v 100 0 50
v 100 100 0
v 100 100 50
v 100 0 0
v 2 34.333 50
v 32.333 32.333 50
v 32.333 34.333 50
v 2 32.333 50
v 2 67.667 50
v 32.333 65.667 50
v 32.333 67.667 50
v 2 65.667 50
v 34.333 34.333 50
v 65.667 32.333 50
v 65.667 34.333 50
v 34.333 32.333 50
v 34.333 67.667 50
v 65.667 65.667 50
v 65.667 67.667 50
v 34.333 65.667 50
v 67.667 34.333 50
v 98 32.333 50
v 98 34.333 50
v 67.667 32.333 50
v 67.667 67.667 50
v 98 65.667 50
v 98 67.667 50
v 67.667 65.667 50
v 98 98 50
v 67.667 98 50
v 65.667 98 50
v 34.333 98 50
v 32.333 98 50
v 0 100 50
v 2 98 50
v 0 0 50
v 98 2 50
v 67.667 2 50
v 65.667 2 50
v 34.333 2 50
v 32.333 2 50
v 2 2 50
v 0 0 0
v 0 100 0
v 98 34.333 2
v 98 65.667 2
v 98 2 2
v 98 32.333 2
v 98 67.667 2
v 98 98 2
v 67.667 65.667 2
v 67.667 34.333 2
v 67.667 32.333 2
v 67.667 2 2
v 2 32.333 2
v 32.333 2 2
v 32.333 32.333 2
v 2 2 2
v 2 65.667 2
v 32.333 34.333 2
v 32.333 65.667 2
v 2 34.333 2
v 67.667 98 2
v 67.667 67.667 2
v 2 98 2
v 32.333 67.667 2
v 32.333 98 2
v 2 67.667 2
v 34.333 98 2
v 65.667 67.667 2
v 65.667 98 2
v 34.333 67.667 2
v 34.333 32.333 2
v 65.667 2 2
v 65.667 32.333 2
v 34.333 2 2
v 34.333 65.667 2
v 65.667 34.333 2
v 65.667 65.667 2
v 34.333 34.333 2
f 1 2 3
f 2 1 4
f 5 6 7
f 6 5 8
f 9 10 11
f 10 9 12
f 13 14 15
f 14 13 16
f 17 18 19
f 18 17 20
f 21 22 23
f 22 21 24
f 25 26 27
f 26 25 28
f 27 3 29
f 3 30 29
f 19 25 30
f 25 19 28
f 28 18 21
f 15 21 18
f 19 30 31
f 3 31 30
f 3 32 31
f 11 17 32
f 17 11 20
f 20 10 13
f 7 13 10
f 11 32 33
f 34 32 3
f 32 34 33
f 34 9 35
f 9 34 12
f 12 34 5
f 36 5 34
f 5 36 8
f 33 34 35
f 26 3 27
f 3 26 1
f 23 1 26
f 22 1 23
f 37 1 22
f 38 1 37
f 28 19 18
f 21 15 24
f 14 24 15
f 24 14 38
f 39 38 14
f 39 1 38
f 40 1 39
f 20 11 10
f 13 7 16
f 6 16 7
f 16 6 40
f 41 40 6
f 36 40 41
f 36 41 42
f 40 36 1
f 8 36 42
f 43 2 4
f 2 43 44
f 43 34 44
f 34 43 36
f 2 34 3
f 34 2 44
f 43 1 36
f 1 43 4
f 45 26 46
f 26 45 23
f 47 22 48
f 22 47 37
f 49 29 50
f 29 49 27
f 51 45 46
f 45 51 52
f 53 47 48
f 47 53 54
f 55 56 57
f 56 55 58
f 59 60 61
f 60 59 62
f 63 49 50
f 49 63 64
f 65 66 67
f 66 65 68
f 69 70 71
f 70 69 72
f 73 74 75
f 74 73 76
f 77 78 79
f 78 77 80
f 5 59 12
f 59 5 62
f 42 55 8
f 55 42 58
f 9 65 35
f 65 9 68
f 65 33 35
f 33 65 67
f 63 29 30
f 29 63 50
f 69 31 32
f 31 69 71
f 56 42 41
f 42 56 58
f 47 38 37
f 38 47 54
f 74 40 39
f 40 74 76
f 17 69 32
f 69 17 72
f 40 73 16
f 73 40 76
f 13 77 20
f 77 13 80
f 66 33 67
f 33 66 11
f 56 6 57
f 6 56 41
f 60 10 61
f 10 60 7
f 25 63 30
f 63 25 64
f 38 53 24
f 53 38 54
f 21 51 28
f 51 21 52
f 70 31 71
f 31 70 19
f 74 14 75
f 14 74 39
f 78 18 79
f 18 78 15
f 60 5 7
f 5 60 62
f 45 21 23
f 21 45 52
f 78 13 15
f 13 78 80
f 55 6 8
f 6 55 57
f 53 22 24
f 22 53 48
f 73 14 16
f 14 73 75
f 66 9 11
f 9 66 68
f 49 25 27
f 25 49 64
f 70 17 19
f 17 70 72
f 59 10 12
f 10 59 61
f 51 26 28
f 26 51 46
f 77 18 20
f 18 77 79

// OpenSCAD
/* [Settings:] */

// Thickness of the walls in mm
wall_thickness = 2; // [1,2,3,4,5]

/* [Dimensions:] */

// Length of the compartment in mm
length = 100;

// Width of the compartment in mm
width = 100;

// Height of the compartment in mm
height = 50;

/* [Compartments:] */

// Vertical dividers (columns)
columns = 2; // [0:10]

// Horizontal dividers (rows)
rows = 2; // [0:10]

module compartment()
{
	// Create the outer shell of the box
	difference()
	{
		// Outer box
		cube([ length, width, height ]);

		// Create the inner void
		translate([ wall_thickness, wall_thickness, wall_thickness ])

		// Subtract inner box
		cube([ length - 2 * wall_thickness, width - 2 * wall_thickness, height - wall_thickness ]);
	}

	// Add column dividers if columns > 0
	if (columns > 0)
	{
		for (i = [1:columns])
		{
			translate([ (length / (columns + 1)) * i - (wall_thickness / 2), wall_thickness, wall_thickness ])
			cube([ wall_thickness, width - 2 * wall_thickness, height - wall_thickness ]);
		}
	}

	// Add row dividers if rows > 0
	if (rows > 0)
	{
		for (j = [1:rows])
		{
			translate([ wall_thickness, (width / (rows + 1)) * j - (wall_thickness / 2), wall_thickness ])
			cube([ length - 2 * wall_thickness, wall_thickness, height - wall_thickness ]);
		}
	}
}

// Call the module to render the compartment with dividers
compartment();
